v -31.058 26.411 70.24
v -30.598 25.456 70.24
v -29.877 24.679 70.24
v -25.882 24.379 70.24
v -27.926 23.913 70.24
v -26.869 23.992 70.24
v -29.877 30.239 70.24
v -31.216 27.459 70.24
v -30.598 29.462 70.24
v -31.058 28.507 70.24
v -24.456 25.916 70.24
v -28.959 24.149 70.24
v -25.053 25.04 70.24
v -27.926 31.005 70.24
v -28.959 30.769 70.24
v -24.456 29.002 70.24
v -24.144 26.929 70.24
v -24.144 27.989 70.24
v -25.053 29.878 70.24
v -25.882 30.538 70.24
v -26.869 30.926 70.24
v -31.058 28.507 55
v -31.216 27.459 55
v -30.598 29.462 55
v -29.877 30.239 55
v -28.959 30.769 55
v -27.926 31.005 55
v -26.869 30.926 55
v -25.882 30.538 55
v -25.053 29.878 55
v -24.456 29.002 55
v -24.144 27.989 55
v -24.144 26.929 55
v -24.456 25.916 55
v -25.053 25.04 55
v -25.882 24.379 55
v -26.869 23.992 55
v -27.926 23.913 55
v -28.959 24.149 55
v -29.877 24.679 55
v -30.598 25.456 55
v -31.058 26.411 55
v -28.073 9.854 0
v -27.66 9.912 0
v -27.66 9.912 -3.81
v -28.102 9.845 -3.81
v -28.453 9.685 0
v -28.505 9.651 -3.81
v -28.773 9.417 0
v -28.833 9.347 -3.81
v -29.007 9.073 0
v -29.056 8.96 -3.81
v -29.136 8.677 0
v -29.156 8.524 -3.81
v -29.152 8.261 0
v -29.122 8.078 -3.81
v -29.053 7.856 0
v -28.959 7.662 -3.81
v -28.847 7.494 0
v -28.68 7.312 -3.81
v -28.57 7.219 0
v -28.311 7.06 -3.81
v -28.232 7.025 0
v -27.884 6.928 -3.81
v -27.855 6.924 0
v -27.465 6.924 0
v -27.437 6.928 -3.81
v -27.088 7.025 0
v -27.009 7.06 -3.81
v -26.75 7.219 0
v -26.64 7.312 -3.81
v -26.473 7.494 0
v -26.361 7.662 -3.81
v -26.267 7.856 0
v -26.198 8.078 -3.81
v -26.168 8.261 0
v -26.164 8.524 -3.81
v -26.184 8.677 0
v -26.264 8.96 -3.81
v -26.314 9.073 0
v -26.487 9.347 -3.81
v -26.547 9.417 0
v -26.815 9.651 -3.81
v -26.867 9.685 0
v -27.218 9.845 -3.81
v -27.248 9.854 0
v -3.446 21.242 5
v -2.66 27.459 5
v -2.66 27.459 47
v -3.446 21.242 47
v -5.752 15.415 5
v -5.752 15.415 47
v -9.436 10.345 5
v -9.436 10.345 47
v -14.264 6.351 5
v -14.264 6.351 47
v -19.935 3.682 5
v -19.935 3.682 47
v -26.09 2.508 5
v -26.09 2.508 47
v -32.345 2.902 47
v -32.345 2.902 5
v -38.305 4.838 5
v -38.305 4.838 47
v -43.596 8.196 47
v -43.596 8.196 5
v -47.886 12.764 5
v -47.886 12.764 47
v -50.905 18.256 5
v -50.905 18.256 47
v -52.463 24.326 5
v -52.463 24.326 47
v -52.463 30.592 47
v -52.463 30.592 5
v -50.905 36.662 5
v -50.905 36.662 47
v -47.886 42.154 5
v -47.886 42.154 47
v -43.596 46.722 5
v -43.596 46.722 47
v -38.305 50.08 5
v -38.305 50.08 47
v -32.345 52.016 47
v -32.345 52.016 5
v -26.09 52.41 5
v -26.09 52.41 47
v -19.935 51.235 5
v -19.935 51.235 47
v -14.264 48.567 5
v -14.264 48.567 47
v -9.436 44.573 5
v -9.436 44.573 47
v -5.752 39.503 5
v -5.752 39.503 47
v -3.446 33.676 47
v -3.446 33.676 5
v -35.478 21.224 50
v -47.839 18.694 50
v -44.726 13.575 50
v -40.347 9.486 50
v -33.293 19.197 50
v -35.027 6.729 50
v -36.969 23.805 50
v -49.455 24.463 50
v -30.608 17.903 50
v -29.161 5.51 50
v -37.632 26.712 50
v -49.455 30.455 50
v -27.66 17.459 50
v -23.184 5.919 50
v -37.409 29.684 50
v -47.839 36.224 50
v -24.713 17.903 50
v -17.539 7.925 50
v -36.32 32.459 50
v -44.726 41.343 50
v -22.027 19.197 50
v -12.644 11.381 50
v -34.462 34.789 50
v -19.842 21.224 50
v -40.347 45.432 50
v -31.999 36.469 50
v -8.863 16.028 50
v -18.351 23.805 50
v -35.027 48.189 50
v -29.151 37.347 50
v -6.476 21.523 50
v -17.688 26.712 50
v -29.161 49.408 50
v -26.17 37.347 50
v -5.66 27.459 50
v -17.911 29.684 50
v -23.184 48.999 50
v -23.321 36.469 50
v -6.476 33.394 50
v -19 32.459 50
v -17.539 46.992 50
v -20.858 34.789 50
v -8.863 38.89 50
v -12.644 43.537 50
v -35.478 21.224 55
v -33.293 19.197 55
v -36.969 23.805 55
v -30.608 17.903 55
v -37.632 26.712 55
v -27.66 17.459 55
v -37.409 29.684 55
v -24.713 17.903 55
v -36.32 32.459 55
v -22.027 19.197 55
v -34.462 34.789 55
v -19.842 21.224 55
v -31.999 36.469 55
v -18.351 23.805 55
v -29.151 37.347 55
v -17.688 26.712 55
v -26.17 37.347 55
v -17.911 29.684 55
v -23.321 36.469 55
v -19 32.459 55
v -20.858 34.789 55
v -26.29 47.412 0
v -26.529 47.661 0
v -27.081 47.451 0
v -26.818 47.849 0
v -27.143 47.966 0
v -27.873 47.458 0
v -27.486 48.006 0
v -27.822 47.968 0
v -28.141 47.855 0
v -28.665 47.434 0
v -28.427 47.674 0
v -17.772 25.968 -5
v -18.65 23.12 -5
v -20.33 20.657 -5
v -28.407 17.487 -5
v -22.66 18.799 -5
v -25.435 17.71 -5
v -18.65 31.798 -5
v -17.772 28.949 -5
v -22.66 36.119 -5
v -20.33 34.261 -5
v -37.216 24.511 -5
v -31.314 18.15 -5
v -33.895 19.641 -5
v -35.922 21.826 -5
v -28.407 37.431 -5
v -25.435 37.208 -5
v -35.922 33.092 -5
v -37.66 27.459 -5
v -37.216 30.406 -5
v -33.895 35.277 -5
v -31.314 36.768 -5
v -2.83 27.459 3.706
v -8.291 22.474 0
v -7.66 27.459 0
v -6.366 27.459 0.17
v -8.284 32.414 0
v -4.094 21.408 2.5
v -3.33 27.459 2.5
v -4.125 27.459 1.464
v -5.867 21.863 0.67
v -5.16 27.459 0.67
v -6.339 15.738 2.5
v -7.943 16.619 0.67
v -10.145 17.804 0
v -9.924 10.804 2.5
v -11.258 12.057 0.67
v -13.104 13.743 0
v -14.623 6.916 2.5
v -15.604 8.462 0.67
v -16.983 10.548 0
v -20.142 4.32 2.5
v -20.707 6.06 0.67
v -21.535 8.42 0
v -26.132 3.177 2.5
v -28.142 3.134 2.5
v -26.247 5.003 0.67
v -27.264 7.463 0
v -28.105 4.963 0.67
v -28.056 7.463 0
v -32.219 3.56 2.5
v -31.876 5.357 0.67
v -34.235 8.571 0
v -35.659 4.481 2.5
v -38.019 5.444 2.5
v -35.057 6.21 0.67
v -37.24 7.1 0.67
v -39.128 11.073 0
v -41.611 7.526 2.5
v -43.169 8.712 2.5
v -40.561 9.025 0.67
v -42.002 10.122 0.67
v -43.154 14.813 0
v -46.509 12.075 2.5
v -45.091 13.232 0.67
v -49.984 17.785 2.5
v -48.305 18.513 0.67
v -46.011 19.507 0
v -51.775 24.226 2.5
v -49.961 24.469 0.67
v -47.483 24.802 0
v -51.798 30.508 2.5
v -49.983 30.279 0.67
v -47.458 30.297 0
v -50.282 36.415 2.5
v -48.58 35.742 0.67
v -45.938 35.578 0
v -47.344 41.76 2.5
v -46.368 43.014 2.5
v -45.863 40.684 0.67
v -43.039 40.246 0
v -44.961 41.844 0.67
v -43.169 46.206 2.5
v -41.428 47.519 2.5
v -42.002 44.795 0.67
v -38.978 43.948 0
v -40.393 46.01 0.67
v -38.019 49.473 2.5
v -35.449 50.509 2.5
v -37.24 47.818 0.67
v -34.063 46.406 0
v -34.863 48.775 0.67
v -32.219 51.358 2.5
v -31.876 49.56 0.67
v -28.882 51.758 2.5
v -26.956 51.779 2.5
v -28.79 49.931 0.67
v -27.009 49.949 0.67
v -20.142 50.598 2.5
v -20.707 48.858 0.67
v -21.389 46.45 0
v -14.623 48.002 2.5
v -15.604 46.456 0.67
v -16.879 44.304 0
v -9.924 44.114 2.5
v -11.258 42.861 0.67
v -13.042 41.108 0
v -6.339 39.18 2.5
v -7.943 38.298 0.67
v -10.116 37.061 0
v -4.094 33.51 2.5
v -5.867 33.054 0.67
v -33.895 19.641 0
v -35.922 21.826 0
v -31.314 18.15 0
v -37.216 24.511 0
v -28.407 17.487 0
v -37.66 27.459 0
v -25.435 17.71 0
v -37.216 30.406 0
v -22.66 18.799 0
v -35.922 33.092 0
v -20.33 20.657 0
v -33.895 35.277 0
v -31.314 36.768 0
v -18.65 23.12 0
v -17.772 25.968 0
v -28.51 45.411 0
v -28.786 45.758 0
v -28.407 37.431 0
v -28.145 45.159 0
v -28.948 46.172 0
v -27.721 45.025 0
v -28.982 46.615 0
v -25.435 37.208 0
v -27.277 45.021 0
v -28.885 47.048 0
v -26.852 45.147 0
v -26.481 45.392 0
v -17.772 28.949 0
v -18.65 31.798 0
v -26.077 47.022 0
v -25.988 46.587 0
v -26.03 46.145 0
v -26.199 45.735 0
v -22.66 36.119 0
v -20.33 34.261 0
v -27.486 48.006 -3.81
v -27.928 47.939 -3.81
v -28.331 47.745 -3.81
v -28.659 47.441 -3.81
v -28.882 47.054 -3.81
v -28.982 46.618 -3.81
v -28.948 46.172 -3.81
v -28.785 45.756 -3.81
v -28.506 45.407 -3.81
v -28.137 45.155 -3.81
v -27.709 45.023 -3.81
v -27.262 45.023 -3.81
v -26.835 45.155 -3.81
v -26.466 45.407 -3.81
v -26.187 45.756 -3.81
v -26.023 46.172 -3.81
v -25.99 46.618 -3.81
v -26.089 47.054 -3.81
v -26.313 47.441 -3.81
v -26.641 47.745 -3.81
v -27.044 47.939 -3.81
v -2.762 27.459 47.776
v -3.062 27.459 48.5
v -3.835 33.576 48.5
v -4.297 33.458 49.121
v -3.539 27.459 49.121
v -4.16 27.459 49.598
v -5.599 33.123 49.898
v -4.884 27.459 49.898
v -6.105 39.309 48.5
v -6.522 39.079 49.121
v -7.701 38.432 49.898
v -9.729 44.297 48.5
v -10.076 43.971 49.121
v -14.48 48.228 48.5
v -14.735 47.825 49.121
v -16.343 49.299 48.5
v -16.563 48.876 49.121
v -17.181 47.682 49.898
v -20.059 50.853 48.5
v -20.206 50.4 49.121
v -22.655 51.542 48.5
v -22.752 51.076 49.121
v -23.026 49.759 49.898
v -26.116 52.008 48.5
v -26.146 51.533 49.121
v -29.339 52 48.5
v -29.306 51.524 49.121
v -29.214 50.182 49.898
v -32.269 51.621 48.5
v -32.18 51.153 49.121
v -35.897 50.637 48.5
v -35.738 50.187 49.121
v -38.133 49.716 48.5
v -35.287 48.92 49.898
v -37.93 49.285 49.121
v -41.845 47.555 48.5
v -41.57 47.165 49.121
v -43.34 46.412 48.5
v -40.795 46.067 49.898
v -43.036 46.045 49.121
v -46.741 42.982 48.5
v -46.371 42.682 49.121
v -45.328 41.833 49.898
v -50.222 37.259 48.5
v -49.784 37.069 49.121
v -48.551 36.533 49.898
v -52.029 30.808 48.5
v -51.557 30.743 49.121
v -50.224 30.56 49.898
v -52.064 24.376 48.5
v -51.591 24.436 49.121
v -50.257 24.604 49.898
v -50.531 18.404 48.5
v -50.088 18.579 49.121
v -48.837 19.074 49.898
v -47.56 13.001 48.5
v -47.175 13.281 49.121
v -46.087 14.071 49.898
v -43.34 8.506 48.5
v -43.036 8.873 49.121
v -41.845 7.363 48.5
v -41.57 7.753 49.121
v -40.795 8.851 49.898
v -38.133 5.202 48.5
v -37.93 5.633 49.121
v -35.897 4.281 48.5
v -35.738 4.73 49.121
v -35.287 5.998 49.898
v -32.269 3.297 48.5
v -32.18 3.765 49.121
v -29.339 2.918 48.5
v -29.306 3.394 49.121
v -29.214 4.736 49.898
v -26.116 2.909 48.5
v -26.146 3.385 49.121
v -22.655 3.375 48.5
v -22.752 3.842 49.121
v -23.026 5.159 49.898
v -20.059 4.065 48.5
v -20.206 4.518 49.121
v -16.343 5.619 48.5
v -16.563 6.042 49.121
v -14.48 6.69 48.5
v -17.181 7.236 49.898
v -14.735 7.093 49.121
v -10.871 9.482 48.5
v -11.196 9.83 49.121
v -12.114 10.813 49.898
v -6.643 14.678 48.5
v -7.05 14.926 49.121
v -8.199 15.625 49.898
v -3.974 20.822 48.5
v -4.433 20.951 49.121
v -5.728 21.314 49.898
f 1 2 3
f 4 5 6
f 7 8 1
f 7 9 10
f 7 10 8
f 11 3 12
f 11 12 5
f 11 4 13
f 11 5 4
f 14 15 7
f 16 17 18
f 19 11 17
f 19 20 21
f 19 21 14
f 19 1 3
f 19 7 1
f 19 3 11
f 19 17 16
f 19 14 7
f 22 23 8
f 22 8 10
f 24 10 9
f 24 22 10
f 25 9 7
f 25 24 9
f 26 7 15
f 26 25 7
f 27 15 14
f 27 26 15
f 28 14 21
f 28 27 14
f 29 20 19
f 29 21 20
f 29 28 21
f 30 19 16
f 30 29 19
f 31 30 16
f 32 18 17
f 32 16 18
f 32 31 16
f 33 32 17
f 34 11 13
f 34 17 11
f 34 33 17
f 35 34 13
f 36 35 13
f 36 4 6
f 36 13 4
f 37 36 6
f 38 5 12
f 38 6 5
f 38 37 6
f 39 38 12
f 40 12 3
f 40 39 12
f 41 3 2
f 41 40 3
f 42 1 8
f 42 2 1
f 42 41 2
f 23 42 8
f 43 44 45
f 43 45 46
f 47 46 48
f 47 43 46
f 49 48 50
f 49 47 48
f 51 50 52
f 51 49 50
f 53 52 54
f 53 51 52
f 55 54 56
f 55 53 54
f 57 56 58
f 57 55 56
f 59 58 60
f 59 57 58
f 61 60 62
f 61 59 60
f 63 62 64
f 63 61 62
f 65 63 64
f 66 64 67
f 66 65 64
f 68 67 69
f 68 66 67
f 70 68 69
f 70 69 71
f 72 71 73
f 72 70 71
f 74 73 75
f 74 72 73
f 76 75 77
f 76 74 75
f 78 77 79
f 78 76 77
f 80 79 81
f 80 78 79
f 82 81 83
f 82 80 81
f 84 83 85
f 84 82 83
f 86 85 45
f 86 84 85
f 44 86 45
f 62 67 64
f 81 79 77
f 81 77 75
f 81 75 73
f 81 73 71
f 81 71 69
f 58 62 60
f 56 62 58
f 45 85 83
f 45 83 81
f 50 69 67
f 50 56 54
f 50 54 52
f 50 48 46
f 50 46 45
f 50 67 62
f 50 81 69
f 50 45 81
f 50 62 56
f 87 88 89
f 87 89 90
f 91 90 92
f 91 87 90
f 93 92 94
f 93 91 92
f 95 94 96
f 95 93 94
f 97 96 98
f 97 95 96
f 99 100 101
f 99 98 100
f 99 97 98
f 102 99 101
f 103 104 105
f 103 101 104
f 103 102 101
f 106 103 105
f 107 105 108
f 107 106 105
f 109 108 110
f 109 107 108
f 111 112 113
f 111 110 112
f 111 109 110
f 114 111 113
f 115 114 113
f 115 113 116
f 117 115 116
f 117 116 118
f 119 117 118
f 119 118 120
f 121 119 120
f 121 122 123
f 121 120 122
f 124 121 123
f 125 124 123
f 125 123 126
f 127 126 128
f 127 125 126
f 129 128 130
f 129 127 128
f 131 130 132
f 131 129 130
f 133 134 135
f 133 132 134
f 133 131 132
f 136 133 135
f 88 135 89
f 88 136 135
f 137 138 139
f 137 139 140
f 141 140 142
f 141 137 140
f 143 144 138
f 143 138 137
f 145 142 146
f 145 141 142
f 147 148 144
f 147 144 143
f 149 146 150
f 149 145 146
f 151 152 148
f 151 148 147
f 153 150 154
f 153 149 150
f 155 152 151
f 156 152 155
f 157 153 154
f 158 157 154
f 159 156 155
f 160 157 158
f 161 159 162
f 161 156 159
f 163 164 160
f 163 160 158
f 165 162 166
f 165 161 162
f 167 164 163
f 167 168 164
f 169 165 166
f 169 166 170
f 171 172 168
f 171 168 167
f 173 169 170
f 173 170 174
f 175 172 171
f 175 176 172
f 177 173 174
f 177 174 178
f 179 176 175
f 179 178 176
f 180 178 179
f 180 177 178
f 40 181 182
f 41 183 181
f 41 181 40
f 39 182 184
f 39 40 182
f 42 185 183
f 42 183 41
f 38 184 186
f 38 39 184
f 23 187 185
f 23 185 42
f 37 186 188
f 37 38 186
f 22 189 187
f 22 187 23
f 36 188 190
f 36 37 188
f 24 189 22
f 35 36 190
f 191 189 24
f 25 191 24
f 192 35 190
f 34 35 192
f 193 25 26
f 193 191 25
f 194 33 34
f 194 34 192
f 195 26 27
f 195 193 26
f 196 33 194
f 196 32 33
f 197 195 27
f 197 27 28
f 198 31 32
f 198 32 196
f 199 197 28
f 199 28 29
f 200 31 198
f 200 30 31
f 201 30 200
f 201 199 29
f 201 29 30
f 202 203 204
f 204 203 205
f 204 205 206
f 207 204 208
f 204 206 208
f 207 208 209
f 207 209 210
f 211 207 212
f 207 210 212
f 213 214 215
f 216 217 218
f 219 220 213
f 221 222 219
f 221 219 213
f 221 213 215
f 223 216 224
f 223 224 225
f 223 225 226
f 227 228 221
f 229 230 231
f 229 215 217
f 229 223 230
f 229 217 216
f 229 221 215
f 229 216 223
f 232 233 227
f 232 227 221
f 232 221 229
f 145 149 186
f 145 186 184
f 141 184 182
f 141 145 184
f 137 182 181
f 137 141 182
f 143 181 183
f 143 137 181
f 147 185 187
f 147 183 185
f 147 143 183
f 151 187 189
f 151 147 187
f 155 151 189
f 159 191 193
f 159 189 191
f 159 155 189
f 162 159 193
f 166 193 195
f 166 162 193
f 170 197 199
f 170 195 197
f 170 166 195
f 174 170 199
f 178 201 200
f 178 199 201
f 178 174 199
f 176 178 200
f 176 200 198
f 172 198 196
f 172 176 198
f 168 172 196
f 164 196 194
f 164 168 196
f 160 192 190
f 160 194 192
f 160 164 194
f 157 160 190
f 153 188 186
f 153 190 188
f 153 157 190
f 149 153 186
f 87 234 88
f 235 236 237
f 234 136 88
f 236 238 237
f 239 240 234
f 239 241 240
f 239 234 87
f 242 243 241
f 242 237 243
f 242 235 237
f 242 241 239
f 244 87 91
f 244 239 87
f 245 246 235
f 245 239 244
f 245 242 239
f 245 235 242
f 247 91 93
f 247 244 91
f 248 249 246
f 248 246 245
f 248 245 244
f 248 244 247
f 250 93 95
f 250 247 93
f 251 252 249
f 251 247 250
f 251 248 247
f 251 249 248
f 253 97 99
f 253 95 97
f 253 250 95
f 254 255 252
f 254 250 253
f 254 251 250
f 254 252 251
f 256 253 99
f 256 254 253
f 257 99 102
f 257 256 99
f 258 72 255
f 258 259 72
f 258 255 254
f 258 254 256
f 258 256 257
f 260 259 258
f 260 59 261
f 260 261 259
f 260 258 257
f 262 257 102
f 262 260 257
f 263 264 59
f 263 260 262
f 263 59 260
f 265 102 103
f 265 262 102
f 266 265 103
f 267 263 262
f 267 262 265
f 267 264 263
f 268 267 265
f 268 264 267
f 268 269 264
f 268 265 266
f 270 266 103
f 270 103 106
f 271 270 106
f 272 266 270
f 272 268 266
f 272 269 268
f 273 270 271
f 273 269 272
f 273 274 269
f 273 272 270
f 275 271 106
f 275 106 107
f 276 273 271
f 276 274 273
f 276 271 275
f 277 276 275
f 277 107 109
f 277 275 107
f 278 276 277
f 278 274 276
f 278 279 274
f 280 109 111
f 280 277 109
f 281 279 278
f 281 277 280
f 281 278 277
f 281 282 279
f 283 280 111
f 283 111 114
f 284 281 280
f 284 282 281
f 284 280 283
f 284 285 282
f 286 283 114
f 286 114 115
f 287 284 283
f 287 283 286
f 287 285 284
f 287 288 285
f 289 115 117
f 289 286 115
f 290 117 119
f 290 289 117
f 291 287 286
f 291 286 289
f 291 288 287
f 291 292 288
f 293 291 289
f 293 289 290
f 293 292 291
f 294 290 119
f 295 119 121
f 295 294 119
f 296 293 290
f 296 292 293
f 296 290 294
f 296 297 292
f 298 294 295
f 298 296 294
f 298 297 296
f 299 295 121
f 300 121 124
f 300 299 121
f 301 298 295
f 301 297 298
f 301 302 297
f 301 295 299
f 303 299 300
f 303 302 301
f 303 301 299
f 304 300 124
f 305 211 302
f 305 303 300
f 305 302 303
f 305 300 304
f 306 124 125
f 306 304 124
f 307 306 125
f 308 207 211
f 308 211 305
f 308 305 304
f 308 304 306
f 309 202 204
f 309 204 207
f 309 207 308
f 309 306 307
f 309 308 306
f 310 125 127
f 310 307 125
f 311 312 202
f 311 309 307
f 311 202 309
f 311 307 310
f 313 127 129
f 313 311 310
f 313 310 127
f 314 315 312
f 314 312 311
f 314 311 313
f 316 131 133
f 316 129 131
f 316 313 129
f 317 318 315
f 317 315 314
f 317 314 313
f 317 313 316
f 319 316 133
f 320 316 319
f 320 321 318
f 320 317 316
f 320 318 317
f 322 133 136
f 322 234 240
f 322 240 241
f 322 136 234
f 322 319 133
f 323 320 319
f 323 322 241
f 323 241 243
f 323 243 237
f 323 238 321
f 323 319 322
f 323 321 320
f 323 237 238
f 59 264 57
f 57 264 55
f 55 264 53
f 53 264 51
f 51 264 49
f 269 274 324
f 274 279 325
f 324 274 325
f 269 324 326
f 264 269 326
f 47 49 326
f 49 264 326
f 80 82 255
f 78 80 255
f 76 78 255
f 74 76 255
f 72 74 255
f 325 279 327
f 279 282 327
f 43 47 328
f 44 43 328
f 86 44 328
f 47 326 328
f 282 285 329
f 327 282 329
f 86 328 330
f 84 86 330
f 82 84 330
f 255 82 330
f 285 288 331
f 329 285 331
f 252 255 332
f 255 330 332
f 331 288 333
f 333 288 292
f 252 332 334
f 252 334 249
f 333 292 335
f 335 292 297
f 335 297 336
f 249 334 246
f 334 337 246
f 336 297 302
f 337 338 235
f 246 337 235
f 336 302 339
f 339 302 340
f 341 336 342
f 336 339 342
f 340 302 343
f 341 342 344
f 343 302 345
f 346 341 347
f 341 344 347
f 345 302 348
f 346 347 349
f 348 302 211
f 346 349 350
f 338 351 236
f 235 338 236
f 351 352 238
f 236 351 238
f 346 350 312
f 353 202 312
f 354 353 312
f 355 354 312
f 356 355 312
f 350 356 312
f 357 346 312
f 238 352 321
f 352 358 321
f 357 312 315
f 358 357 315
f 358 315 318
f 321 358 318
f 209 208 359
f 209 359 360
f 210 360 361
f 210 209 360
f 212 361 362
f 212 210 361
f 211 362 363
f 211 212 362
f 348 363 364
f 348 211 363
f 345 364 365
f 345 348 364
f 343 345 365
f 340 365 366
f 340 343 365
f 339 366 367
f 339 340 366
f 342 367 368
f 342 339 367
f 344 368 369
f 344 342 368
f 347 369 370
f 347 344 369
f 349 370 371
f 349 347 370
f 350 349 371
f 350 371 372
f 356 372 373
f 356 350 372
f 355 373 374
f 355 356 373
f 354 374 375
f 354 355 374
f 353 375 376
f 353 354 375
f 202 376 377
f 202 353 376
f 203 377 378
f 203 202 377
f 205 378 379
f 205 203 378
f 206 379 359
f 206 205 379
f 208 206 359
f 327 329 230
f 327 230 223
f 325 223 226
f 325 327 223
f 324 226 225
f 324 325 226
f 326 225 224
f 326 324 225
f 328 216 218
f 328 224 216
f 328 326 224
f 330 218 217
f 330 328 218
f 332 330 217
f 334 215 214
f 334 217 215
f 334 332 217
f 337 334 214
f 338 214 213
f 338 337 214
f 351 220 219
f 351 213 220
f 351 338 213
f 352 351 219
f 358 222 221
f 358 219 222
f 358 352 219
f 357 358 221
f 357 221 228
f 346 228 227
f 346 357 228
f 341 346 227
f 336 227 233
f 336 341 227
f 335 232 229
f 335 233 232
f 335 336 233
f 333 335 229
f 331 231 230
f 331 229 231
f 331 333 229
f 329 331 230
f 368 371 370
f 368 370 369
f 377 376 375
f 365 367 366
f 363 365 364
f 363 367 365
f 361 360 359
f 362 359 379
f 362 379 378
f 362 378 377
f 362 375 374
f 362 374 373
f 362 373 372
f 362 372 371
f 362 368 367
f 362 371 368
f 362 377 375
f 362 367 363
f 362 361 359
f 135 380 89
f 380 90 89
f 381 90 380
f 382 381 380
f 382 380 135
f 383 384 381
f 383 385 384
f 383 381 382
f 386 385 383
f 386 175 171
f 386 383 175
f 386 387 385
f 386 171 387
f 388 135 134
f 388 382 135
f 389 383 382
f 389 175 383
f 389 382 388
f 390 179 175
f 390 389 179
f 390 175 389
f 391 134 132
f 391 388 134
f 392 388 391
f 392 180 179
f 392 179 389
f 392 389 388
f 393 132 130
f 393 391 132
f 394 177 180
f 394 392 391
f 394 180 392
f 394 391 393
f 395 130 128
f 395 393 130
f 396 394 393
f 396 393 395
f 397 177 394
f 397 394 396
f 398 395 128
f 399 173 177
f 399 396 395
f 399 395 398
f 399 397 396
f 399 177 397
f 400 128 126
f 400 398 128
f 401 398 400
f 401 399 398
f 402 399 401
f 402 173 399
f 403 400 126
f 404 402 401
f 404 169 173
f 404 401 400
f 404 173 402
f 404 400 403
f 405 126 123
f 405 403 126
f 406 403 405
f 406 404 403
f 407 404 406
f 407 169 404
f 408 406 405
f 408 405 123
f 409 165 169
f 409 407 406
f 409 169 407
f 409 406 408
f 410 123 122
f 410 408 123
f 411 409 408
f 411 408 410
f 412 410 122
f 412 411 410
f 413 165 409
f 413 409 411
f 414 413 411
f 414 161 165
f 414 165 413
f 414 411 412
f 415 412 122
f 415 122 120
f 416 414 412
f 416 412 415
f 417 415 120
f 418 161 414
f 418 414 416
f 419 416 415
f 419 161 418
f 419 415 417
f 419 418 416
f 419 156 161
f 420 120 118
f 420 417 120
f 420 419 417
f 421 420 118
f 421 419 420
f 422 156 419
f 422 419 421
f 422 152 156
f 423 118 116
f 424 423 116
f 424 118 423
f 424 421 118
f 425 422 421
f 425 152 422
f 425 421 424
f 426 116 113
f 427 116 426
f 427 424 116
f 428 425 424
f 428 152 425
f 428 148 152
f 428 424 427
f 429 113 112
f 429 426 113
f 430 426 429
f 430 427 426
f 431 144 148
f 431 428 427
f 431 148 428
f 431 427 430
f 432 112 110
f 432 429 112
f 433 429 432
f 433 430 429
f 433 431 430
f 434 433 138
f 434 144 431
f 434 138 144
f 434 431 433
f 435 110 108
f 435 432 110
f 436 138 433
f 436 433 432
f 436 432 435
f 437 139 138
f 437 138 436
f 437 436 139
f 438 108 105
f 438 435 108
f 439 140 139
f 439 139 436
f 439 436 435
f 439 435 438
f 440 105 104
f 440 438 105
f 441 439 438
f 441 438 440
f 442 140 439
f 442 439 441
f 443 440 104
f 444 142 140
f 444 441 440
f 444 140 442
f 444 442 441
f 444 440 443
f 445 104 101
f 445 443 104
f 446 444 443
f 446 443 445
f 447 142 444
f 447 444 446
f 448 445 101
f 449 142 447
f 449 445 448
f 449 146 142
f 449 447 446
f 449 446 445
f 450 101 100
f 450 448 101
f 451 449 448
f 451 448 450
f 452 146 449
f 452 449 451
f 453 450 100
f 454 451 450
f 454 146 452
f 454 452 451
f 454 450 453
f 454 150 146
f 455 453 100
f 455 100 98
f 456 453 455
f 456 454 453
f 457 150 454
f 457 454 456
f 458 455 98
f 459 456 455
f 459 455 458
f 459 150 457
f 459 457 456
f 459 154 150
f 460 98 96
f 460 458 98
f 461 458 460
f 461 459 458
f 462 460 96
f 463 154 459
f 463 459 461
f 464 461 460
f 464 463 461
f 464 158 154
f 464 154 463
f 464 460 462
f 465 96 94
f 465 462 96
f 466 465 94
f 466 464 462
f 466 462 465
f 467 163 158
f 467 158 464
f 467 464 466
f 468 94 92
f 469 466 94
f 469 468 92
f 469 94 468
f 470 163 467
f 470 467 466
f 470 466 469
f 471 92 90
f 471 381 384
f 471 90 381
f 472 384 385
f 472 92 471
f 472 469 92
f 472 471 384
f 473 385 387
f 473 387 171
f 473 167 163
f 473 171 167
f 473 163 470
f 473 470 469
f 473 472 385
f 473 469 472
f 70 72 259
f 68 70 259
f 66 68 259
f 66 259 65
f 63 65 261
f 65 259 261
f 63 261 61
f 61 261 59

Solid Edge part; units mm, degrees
sketch "Sketch1" plane through (0, 0, 0) normal (0, 0, 1) x (1, 0, 0)
  circle A0 centre (-27.6601, 27.4589) radius 25
extrude "Protrusion1" add sketch "Sketch1" along normal blind 50
fillet "Round_1" radius 5 1 edges at (-52.6601, 27.4589, 0)
fillet "Round_2" radius 3 1 edges at (-52.6601, 27.4589, 50)
sketch "Sketch2" plane through (-27.6601, 27.4589, 50) normal (0, 0, 1) x (0, -1, 0)
  circle A0 centre (0, 0) radius 10
extrude "ExtrudedProtrusion_2" add sketch "Sketch2" along normal blind 5
sketch "Sketch3" plane through (-27.6601, 27.4589, 0) normal (0, 0, -1) x (-1, 0, 0)
  circle A0 centre (0, 0) radius 10
extrude "ExtrudedProtrusion_3" add sketch "Sketch3" along normal blind 5
sketch "Sketch4" plane through (-27.6601, 27.4589, 55) normal (0, 0, 1) x (-1, 0, 0)
  circle A0 centre (0, 0) radius 3.556
extrude "ExtrudedProtrusion_4" add sketch "Sketch4" along normal blind 15.24
sketch "Sketch5" plane through (-27.6601, 27.4589, 0) normal (0, 0, -1) x (0, 1, 0)
  circle A0 centre (-19.0472, 0) radius 1.5
  circle A1 centre (19.0472, 0.1743) radius 1.5
extrude "ExtrudedProtrusion_6" add sketch "Sketch5" along normal blind 3.81
